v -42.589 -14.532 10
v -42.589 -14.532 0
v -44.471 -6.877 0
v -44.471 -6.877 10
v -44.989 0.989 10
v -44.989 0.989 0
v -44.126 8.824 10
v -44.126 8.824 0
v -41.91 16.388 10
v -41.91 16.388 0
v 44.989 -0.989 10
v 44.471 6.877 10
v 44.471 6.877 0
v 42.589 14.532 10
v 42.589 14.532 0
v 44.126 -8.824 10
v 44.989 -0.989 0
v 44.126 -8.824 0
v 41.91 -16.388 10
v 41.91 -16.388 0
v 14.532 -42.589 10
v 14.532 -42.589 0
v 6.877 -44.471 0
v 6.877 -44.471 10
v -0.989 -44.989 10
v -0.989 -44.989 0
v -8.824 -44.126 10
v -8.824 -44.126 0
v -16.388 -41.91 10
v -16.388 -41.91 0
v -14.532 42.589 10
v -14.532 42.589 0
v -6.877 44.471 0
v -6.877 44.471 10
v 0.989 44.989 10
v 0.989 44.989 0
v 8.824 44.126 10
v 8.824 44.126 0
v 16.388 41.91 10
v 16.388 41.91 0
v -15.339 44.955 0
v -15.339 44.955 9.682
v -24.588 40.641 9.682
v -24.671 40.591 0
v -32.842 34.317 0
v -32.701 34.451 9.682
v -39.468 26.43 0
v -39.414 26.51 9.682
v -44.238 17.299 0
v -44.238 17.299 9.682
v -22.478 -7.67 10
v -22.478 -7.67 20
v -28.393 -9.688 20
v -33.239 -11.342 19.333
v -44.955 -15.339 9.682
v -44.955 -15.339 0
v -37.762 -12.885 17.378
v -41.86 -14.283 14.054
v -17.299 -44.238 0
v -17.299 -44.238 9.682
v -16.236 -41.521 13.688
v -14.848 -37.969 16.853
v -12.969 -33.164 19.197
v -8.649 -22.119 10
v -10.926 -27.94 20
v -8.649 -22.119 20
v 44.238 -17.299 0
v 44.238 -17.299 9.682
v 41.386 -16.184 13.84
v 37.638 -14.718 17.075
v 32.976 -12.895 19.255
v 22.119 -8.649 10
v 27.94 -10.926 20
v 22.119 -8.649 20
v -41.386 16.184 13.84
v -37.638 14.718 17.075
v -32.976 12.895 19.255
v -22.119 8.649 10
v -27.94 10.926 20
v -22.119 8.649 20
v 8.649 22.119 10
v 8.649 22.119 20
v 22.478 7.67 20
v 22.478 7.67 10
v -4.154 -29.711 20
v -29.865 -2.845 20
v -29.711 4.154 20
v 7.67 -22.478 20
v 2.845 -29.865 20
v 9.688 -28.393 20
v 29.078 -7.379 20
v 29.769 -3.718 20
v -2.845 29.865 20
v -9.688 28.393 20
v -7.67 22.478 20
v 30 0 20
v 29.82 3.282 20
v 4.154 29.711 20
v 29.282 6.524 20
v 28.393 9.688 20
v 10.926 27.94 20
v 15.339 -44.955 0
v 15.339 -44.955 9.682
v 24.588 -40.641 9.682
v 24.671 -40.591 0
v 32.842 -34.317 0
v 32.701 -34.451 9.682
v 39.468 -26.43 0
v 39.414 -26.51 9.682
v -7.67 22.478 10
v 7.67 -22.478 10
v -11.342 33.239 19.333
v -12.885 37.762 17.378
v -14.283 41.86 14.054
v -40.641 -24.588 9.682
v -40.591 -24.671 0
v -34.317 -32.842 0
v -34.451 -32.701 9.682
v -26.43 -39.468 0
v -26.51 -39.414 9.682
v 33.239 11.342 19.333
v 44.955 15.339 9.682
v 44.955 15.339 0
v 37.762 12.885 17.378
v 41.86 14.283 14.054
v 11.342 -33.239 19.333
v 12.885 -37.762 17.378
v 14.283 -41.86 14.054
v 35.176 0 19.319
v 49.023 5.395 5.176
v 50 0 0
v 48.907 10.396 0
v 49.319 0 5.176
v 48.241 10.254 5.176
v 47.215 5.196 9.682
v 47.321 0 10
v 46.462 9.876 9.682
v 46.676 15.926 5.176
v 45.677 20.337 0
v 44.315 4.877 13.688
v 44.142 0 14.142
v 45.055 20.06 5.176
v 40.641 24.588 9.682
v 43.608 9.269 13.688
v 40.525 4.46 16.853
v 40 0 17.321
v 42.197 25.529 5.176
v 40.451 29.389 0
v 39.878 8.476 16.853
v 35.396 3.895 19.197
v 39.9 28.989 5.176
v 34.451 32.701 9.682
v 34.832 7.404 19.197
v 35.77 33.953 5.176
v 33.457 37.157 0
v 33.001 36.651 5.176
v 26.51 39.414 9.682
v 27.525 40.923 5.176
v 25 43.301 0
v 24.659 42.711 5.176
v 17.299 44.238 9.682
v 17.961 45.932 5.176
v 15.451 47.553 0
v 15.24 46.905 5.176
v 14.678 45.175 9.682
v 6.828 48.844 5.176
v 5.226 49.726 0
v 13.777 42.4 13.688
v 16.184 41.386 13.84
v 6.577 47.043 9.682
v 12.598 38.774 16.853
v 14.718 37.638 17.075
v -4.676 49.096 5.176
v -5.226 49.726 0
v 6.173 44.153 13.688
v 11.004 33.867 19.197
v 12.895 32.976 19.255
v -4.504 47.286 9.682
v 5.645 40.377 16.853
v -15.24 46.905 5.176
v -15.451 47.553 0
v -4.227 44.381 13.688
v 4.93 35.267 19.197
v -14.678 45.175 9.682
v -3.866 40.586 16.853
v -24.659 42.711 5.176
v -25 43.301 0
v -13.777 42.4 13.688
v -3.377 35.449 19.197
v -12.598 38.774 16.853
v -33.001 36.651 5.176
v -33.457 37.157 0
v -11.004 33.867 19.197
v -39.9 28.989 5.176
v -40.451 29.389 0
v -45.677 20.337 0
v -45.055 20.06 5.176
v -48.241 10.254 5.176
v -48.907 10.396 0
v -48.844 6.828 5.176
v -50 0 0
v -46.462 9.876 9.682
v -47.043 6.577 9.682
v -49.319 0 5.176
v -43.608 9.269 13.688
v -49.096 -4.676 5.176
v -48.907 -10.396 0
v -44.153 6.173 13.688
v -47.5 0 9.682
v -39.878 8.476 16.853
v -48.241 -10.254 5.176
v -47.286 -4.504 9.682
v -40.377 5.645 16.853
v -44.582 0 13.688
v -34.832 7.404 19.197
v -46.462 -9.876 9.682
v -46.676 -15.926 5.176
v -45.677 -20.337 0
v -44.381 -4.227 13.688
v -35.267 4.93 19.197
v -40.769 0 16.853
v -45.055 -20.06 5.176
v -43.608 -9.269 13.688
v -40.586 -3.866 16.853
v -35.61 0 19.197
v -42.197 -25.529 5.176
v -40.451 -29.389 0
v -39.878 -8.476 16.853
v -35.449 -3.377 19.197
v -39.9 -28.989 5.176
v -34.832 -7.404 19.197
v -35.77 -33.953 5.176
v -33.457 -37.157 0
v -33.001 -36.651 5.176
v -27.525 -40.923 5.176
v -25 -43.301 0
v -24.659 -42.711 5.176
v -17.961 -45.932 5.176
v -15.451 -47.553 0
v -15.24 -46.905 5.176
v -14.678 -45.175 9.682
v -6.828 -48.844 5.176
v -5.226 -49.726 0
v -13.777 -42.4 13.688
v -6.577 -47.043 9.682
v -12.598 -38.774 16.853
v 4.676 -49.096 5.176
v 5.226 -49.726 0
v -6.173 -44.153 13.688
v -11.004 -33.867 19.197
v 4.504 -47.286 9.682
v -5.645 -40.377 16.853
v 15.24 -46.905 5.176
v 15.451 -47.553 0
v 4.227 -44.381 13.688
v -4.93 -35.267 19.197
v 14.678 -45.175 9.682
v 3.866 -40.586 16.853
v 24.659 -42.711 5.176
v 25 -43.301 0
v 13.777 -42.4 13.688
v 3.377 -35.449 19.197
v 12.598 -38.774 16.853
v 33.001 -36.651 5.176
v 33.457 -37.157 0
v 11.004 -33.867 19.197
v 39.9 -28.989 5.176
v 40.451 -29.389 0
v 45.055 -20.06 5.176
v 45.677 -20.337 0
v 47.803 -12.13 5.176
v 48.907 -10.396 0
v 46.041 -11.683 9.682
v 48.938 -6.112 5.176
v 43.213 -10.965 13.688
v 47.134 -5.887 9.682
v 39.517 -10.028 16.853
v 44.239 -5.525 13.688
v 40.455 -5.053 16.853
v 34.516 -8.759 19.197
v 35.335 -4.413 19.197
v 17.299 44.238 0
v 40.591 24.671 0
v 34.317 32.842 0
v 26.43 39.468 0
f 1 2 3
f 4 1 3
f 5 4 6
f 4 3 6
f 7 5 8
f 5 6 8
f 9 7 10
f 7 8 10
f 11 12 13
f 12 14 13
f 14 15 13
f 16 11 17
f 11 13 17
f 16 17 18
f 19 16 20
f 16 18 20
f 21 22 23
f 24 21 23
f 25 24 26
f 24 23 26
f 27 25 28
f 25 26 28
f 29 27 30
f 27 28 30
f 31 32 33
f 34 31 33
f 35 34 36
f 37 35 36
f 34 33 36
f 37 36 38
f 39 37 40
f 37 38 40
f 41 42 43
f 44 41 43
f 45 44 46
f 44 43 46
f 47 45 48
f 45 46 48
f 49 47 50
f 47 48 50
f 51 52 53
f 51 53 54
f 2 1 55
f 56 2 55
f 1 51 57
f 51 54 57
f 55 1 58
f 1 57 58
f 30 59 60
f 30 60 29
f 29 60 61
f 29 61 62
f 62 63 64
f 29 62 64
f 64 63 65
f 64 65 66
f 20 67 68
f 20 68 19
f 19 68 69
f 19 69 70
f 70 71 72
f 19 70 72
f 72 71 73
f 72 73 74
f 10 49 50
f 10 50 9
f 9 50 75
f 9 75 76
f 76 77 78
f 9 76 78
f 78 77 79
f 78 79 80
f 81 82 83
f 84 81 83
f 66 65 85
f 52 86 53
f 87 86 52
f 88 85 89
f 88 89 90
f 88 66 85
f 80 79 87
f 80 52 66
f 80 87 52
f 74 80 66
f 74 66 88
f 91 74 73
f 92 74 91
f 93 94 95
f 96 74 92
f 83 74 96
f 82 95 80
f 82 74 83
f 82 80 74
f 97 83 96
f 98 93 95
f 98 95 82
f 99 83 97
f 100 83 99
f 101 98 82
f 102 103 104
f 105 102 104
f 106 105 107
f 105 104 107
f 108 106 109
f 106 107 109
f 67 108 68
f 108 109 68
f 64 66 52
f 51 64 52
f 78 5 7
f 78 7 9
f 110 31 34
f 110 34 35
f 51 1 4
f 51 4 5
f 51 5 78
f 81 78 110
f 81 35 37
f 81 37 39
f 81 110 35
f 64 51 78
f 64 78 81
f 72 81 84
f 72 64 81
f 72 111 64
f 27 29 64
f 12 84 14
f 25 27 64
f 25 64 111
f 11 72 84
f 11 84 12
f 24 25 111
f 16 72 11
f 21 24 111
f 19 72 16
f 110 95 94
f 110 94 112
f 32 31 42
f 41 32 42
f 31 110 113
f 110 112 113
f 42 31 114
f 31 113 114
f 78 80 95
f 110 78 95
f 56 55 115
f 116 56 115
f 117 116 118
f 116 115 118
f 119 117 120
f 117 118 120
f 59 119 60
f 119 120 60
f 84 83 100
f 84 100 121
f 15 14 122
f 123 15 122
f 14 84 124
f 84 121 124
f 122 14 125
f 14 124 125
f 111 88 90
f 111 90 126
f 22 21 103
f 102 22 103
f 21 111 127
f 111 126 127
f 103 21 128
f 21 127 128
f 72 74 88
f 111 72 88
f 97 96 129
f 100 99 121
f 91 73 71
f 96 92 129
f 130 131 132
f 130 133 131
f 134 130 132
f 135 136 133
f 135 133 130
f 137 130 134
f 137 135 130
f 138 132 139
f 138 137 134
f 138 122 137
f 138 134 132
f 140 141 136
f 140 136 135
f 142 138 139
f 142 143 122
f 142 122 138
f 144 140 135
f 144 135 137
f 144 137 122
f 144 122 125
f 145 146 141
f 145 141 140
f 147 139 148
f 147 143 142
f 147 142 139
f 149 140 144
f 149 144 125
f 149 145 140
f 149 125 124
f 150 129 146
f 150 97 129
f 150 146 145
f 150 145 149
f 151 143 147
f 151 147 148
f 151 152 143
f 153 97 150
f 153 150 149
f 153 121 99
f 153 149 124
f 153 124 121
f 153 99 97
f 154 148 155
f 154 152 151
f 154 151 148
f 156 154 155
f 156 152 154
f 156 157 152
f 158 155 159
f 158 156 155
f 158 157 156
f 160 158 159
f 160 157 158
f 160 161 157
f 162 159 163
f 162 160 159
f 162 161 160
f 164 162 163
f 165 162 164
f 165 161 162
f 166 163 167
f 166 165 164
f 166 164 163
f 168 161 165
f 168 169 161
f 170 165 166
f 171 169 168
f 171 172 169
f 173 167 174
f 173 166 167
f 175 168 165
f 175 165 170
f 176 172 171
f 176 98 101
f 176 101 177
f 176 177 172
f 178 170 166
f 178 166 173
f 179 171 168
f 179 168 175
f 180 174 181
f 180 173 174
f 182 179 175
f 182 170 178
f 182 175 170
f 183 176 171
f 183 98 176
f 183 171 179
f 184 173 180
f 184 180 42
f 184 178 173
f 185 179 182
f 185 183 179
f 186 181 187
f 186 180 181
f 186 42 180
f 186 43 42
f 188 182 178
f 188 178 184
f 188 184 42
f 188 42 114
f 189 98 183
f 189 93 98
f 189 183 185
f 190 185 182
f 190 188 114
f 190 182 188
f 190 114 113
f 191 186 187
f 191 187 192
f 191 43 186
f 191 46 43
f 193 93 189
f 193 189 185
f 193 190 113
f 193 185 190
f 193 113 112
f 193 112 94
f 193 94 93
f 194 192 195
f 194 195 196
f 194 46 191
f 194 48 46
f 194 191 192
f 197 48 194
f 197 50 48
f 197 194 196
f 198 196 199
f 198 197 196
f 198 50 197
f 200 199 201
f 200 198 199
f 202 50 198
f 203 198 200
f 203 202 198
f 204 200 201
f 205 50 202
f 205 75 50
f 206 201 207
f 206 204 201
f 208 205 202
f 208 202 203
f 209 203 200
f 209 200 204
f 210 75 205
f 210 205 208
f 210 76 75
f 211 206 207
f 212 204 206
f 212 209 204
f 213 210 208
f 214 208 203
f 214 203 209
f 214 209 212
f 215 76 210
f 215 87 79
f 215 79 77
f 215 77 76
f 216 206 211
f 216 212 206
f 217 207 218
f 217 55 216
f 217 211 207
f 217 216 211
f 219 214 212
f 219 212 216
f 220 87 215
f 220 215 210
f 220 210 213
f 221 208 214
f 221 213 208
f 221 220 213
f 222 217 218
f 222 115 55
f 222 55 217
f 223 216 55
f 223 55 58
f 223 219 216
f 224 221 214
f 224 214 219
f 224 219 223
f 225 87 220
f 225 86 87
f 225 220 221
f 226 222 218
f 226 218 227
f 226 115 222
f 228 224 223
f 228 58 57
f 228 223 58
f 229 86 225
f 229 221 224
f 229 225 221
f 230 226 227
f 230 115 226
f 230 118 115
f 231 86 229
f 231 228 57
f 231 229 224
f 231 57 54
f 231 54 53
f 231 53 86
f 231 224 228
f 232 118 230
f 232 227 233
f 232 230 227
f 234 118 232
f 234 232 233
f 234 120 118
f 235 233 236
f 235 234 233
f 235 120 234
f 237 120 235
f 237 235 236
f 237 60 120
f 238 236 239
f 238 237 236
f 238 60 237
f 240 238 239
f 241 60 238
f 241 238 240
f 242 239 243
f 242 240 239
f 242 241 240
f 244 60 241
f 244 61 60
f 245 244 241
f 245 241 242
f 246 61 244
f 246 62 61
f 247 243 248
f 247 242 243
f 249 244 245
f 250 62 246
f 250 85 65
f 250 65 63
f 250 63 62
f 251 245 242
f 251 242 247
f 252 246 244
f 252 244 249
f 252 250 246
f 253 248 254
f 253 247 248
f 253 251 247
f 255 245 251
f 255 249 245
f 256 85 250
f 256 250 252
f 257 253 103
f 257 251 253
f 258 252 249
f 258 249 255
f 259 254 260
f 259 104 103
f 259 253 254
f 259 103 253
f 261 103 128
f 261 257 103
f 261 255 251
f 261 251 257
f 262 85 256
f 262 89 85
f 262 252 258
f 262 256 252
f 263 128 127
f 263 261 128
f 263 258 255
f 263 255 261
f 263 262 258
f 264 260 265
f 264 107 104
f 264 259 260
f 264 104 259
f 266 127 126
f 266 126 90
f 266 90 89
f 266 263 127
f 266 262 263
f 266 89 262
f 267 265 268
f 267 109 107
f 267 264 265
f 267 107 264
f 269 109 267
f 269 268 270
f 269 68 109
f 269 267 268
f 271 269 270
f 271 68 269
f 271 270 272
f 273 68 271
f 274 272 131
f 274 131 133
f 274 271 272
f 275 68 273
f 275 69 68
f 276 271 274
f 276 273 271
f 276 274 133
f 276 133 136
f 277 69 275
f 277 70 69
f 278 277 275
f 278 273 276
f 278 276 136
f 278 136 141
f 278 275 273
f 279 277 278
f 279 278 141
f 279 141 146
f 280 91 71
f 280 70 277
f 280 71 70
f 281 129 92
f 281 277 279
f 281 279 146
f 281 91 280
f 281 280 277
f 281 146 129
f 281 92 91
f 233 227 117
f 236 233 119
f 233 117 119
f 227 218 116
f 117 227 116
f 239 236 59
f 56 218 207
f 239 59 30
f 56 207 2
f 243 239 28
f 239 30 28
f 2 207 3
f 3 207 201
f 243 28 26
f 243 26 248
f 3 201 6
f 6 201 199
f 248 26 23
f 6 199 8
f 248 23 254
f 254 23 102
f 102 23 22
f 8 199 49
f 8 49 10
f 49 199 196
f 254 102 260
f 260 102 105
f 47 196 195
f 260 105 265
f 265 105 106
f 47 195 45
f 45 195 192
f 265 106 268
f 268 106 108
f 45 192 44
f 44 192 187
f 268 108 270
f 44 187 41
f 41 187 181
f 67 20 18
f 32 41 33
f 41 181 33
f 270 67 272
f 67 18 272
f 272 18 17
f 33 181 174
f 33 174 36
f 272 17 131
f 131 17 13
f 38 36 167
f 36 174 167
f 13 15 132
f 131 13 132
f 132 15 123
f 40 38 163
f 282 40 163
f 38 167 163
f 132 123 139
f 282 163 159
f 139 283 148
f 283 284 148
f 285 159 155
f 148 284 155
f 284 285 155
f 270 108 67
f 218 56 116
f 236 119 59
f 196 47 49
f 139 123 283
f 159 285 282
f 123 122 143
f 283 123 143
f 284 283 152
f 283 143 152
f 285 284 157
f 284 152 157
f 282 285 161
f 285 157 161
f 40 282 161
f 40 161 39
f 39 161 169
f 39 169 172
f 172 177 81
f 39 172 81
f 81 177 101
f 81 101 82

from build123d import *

# Parameters (mm, degrees)
F0_R     = 50
F1_DEPTH = 20
F2_R     = 19.99999
F3_R     = 45
F4_DEPTH = 10
F6_DEPTH = 25


# Not quite as in the source:
# - a fillet or chamfer is up to 0.001 mm smaller than in the source, because OpenCascade refuses the exact size


with BuildPart() as f1:
    # F0 (on Top) → F1 (new body)
    with BuildSketch(Plane.XY):
        Circle(F0_R)
    extrude(amount=F1_DEPTH)

    # F2 (radius 20 in the source; OpenCascade refuses exactly that, so slightly less here)
    f2_edges = [f1.edges().sort_by_distance(p)[0] for p in [
        (-50, 0, 20),
    ]]
    fillet(f2_edges, radius=F2_R)

    # F3 (on face) → F4 (cut)
    with BuildSketch(Plane(origin=(0, 0, 0), x_dir=(1, 0, 0), z_dir=(0, 0, -1))):
        Circle(F3_R)
    extrude(amount=-F4_DEPTH, mode=Mode.SUBTRACT)

    # F5 (on face) → F6 (cut)
    with BuildSketch(Plane.XY.offset(20)):
        with BuildLine():
            Line((-22.4775391325, -7.6695980696), (-44.9550782649, -15.3391961392))
            ThreePointArc((-44.9550782649, -15.3391961392), (-34.3172747897, -32.8416602961), (-17.2989432787, -44.2379538568))
            Line((-17.2989432787, -44.2379538568), (-8.6494716394, -22.1189769284))
            Line((-8.6494716394, -22.1189769284), (-22.4775391325, -7.6695980696))
        make_face()
        with BuildLine():
            Line((-7.6695980696, 22.4775391325), (-15.3391961392, 44.9550782649))
            ThreePointArc((-15.3391961392, 44.9550782649), (-32.8416602961, 34.3172747897), (-44.2379538568, 17.2989432787))
            Line((-44.2379538568, 17.2989432787), (-22.1189769284, 8.6494716394))
            Line((-22.1189769284, 8.6494716394), (-7.6695980696, 22.4775391325))
        make_face()
        with BuildLine():
            Line((22.4775391325, 7.6695980696), (44.9550782649, 15.3391961392))
            ThreePointArc((44.9550782649, 15.3391961392), (34.3172747897, 32.8416602961), (17.2989432787, 44.2379538568))
            Line((17.2989432787, 44.2379538568), (8.6494716394, 22.1189769284))
            Line((8.6494716394, 22.1189769284), (22.4775391325, 7.6695980696))
        make_face()
        with BuildLine():
            Line((7.6695980696, -22.4775391325), (15.3391961392, -44.9550782649))
            ThreePointArc((15.3391961392, -44.9550782649), (32.8416602961, -34.3172747897), (44.2379538568, -17.2989432787))
            Line((44.2379538568, -17.2989432787), (22.1189769284, -8.6494716394))
            Line((22.1189769284, -8.6494716394), (7.6695980696, -22.4775391325))
        make_face()
    extrude(amount=-F6_DEPTH, mode=Mode.SUBTRACT)


solid = f1.part
